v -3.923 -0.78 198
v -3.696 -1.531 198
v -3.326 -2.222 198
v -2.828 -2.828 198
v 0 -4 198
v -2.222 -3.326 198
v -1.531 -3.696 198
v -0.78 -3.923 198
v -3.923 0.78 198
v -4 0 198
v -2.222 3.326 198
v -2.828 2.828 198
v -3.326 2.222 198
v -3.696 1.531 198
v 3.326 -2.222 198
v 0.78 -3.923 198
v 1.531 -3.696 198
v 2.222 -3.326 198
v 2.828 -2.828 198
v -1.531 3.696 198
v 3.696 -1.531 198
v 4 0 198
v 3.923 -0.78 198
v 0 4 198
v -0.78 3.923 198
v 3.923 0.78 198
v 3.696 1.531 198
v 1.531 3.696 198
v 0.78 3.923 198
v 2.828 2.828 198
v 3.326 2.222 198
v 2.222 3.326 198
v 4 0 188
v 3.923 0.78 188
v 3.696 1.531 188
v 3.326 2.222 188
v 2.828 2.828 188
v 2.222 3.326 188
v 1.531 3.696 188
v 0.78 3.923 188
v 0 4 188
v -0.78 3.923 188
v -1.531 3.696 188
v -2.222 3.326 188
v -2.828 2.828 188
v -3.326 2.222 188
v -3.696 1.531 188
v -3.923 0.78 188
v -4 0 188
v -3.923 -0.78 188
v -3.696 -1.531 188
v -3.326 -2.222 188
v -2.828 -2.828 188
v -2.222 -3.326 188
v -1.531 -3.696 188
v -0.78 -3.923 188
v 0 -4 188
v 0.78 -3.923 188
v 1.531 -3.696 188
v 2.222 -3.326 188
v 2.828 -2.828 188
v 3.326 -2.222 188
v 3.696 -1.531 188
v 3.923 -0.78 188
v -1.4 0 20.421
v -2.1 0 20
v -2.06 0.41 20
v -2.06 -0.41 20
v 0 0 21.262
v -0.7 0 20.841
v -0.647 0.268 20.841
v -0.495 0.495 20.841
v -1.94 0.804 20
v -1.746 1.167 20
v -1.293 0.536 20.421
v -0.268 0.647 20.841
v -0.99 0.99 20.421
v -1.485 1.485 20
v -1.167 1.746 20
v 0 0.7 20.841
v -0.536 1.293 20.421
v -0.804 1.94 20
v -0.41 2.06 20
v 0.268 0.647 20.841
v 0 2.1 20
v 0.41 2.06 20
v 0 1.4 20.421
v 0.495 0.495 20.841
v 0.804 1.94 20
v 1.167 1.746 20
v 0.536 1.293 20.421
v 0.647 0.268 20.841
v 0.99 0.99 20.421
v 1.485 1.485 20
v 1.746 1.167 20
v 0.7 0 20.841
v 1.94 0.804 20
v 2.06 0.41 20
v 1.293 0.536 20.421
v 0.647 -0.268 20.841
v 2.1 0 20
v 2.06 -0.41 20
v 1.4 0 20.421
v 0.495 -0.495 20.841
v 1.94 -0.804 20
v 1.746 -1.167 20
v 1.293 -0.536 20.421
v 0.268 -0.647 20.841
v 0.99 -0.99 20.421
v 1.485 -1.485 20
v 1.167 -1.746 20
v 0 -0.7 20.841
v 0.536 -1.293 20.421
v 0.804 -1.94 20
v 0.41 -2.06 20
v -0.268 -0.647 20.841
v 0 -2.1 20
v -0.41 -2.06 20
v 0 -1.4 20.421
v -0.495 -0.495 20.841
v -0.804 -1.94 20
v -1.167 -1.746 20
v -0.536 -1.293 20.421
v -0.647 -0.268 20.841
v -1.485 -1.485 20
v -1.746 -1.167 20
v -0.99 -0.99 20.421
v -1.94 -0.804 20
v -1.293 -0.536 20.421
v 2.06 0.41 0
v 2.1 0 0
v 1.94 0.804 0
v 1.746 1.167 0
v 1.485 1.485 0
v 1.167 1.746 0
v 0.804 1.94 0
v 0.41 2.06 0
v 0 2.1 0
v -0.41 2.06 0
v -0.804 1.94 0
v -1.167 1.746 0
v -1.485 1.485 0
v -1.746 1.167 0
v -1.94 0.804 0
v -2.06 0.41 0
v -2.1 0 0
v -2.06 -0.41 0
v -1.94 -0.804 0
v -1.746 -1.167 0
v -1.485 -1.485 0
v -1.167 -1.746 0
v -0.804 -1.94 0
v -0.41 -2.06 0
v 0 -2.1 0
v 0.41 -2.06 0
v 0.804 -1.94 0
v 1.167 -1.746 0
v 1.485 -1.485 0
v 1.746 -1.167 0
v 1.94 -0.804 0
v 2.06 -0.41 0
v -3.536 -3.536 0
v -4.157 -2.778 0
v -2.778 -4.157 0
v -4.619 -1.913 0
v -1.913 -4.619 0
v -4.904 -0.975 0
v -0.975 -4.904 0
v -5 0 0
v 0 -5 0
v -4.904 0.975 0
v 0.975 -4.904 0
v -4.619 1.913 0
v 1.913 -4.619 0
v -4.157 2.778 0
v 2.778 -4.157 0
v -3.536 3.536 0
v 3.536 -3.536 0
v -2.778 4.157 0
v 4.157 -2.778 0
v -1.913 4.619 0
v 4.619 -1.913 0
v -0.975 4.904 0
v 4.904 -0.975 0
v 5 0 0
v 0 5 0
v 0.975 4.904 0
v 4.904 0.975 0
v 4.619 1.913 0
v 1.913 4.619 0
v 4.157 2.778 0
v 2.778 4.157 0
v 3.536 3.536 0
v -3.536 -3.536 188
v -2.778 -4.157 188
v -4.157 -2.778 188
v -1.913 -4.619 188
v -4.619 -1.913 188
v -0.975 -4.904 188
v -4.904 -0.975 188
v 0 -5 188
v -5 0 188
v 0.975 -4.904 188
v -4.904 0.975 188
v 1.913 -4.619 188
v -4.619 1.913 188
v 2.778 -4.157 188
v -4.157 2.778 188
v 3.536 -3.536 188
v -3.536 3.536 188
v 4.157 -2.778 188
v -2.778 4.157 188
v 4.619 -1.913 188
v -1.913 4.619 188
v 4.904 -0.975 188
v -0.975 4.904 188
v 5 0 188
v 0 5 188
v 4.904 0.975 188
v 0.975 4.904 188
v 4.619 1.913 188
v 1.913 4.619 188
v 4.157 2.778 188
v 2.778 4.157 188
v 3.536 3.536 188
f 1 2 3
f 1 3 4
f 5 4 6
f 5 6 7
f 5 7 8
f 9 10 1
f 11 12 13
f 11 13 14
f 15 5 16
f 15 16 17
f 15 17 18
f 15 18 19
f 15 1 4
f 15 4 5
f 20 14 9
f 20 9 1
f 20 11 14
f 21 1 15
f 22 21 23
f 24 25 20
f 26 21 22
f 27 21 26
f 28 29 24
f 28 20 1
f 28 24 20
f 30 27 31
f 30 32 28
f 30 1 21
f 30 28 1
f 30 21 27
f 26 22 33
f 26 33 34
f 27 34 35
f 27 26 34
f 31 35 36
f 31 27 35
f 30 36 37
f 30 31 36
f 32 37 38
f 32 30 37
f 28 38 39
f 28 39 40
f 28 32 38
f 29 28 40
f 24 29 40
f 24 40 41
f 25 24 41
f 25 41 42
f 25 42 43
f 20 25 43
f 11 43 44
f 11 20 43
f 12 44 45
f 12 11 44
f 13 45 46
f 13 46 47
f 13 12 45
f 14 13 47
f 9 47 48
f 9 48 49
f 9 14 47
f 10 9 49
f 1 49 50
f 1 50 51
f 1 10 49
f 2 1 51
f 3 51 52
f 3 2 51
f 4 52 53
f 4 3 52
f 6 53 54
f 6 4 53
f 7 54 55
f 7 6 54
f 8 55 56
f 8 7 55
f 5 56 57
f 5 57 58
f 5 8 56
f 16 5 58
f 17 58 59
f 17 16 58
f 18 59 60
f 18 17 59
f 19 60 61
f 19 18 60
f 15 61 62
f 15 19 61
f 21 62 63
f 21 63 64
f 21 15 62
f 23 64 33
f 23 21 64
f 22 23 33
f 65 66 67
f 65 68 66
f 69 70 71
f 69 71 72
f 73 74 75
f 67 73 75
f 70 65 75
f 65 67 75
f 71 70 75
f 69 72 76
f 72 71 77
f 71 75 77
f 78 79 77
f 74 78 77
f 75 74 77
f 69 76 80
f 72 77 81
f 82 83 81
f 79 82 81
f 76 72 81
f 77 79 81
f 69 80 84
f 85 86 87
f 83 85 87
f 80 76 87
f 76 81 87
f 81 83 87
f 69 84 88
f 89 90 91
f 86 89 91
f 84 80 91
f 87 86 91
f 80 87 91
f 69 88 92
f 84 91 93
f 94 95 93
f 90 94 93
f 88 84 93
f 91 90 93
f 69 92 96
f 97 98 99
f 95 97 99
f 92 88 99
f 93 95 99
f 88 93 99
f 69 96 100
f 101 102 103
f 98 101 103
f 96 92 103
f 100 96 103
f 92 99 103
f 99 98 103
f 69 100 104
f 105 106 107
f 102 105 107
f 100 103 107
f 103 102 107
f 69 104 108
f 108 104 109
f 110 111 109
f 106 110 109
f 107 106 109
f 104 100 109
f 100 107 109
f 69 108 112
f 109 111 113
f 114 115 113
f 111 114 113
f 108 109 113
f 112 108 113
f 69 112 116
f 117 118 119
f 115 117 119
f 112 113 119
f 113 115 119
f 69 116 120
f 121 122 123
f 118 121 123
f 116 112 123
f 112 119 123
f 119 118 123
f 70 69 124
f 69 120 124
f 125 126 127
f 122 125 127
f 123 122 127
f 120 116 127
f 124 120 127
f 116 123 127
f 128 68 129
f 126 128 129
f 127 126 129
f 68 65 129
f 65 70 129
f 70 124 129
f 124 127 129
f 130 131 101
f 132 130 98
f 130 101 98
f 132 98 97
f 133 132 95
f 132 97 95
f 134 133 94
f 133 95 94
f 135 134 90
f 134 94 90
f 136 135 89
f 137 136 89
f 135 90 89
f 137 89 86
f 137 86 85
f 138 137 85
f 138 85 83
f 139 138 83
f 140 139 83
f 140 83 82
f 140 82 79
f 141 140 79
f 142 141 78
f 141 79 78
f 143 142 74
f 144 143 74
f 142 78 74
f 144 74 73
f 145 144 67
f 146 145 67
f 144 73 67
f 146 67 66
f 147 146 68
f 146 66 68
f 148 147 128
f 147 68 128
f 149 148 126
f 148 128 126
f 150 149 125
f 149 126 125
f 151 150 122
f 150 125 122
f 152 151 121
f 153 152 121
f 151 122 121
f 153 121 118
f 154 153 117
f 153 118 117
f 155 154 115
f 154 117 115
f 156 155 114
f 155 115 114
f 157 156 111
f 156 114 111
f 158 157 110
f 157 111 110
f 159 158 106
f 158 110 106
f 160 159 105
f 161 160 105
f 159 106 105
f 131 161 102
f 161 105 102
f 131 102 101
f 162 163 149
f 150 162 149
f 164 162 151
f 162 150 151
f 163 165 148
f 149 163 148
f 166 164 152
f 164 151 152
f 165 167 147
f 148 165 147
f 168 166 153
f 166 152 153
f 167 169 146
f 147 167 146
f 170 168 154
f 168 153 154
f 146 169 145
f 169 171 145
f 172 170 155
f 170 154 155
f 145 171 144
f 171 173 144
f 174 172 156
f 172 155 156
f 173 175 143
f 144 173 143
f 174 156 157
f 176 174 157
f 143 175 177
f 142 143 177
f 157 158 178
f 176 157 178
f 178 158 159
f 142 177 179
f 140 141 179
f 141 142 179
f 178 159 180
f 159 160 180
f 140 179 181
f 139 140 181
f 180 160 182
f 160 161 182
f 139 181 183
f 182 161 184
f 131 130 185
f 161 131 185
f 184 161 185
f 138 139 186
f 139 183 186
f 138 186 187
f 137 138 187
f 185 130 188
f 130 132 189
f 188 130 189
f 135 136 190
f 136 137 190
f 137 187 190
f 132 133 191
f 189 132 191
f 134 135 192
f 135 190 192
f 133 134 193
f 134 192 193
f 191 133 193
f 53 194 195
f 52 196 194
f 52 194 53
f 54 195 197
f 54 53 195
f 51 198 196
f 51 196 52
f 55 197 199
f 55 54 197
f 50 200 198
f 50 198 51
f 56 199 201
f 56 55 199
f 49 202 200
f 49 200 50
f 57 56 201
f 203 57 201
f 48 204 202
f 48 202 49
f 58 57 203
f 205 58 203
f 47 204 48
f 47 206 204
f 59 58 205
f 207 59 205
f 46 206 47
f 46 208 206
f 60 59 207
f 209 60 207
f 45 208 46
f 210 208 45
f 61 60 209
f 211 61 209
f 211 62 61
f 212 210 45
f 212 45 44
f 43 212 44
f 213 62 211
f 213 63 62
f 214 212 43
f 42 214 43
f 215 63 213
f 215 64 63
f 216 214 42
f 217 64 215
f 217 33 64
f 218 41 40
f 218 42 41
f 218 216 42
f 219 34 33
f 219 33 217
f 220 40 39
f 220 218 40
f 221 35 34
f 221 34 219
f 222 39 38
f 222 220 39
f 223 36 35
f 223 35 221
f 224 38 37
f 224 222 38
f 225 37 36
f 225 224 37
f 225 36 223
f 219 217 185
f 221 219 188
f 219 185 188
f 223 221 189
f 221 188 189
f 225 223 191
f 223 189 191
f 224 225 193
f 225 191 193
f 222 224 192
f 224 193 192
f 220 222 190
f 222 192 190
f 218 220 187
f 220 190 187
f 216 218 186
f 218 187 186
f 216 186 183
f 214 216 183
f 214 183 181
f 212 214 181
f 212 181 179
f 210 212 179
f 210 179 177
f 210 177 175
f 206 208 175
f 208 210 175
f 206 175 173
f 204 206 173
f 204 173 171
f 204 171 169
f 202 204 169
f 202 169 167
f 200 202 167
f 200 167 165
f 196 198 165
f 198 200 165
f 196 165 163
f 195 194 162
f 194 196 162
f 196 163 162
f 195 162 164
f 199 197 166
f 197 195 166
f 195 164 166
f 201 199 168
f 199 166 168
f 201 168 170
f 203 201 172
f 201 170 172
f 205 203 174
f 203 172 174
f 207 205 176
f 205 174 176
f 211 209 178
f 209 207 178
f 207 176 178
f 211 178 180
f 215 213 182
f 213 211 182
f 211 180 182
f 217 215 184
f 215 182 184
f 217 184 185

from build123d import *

# Parameters (mm, degrees)
SKETCH1_R                  = 5
BOSS_EXTRUDE1_DEPTH        = 198
OTW_R_GWINTOWANY_M52_D     = 4.2
OTW_R_GWINTOWANY_M52_DEPTH = 20
OTW_R_GWINTOWANY_M52_TIP   = 1.2618073
SZKIC7_R                   = 5.5
SZKIC7_R_2                 = 4
WYTNIJ_WYCI_GNI_CIE1_DEPTH = 10


with BuildPart() as part:
    # Sketch1 → Boss-Extrude1 (new body)
    with BuildSketch(Plane.XY):
        Circle(SKETCH1_R)
    extrude(amount=BOSS_EXTRUDE1_DEPTH)

    # Otwór gwintowany M52
    with Locations(Plane(origin=(0, 0, 0), x_dir=(-1, 0, 0), z_dir=(0, 0, -1))):
        with Locations((0, 0)):
            Hole(OTW_R_GWINTOWANY_M52_D / 2, depth=OTW_R_GWINTOWANY_M52_DEPTH)
            with Locations((0, 0, -(OTW_R_GWINTOWANY_M52_DEPTH + OTW_R_GWINTOWANY_M52_TIP / 2))):  # 118° drill point
                Cone(0, OTW_R_GWINTOWANY_M52_D / 2, OTW_R_GWINTOWANY_M52_TIP, mode=Mode.SUBTRACT)

    # Szkic7 → Wytnij-wyciągnięcie1 (cut)
    with BuildSketch(Plane.XY.offset(198)):
        Circle(SZKIC7_R)
        Circle(SZKIC7_R_2, mode=Mode.SUBTRACT)
    extrude(amount=-WYTNIJ_WYCI_GNI_CIE1_DEPTH, mode=Mode.SUBTRACT)


solid = part.part
